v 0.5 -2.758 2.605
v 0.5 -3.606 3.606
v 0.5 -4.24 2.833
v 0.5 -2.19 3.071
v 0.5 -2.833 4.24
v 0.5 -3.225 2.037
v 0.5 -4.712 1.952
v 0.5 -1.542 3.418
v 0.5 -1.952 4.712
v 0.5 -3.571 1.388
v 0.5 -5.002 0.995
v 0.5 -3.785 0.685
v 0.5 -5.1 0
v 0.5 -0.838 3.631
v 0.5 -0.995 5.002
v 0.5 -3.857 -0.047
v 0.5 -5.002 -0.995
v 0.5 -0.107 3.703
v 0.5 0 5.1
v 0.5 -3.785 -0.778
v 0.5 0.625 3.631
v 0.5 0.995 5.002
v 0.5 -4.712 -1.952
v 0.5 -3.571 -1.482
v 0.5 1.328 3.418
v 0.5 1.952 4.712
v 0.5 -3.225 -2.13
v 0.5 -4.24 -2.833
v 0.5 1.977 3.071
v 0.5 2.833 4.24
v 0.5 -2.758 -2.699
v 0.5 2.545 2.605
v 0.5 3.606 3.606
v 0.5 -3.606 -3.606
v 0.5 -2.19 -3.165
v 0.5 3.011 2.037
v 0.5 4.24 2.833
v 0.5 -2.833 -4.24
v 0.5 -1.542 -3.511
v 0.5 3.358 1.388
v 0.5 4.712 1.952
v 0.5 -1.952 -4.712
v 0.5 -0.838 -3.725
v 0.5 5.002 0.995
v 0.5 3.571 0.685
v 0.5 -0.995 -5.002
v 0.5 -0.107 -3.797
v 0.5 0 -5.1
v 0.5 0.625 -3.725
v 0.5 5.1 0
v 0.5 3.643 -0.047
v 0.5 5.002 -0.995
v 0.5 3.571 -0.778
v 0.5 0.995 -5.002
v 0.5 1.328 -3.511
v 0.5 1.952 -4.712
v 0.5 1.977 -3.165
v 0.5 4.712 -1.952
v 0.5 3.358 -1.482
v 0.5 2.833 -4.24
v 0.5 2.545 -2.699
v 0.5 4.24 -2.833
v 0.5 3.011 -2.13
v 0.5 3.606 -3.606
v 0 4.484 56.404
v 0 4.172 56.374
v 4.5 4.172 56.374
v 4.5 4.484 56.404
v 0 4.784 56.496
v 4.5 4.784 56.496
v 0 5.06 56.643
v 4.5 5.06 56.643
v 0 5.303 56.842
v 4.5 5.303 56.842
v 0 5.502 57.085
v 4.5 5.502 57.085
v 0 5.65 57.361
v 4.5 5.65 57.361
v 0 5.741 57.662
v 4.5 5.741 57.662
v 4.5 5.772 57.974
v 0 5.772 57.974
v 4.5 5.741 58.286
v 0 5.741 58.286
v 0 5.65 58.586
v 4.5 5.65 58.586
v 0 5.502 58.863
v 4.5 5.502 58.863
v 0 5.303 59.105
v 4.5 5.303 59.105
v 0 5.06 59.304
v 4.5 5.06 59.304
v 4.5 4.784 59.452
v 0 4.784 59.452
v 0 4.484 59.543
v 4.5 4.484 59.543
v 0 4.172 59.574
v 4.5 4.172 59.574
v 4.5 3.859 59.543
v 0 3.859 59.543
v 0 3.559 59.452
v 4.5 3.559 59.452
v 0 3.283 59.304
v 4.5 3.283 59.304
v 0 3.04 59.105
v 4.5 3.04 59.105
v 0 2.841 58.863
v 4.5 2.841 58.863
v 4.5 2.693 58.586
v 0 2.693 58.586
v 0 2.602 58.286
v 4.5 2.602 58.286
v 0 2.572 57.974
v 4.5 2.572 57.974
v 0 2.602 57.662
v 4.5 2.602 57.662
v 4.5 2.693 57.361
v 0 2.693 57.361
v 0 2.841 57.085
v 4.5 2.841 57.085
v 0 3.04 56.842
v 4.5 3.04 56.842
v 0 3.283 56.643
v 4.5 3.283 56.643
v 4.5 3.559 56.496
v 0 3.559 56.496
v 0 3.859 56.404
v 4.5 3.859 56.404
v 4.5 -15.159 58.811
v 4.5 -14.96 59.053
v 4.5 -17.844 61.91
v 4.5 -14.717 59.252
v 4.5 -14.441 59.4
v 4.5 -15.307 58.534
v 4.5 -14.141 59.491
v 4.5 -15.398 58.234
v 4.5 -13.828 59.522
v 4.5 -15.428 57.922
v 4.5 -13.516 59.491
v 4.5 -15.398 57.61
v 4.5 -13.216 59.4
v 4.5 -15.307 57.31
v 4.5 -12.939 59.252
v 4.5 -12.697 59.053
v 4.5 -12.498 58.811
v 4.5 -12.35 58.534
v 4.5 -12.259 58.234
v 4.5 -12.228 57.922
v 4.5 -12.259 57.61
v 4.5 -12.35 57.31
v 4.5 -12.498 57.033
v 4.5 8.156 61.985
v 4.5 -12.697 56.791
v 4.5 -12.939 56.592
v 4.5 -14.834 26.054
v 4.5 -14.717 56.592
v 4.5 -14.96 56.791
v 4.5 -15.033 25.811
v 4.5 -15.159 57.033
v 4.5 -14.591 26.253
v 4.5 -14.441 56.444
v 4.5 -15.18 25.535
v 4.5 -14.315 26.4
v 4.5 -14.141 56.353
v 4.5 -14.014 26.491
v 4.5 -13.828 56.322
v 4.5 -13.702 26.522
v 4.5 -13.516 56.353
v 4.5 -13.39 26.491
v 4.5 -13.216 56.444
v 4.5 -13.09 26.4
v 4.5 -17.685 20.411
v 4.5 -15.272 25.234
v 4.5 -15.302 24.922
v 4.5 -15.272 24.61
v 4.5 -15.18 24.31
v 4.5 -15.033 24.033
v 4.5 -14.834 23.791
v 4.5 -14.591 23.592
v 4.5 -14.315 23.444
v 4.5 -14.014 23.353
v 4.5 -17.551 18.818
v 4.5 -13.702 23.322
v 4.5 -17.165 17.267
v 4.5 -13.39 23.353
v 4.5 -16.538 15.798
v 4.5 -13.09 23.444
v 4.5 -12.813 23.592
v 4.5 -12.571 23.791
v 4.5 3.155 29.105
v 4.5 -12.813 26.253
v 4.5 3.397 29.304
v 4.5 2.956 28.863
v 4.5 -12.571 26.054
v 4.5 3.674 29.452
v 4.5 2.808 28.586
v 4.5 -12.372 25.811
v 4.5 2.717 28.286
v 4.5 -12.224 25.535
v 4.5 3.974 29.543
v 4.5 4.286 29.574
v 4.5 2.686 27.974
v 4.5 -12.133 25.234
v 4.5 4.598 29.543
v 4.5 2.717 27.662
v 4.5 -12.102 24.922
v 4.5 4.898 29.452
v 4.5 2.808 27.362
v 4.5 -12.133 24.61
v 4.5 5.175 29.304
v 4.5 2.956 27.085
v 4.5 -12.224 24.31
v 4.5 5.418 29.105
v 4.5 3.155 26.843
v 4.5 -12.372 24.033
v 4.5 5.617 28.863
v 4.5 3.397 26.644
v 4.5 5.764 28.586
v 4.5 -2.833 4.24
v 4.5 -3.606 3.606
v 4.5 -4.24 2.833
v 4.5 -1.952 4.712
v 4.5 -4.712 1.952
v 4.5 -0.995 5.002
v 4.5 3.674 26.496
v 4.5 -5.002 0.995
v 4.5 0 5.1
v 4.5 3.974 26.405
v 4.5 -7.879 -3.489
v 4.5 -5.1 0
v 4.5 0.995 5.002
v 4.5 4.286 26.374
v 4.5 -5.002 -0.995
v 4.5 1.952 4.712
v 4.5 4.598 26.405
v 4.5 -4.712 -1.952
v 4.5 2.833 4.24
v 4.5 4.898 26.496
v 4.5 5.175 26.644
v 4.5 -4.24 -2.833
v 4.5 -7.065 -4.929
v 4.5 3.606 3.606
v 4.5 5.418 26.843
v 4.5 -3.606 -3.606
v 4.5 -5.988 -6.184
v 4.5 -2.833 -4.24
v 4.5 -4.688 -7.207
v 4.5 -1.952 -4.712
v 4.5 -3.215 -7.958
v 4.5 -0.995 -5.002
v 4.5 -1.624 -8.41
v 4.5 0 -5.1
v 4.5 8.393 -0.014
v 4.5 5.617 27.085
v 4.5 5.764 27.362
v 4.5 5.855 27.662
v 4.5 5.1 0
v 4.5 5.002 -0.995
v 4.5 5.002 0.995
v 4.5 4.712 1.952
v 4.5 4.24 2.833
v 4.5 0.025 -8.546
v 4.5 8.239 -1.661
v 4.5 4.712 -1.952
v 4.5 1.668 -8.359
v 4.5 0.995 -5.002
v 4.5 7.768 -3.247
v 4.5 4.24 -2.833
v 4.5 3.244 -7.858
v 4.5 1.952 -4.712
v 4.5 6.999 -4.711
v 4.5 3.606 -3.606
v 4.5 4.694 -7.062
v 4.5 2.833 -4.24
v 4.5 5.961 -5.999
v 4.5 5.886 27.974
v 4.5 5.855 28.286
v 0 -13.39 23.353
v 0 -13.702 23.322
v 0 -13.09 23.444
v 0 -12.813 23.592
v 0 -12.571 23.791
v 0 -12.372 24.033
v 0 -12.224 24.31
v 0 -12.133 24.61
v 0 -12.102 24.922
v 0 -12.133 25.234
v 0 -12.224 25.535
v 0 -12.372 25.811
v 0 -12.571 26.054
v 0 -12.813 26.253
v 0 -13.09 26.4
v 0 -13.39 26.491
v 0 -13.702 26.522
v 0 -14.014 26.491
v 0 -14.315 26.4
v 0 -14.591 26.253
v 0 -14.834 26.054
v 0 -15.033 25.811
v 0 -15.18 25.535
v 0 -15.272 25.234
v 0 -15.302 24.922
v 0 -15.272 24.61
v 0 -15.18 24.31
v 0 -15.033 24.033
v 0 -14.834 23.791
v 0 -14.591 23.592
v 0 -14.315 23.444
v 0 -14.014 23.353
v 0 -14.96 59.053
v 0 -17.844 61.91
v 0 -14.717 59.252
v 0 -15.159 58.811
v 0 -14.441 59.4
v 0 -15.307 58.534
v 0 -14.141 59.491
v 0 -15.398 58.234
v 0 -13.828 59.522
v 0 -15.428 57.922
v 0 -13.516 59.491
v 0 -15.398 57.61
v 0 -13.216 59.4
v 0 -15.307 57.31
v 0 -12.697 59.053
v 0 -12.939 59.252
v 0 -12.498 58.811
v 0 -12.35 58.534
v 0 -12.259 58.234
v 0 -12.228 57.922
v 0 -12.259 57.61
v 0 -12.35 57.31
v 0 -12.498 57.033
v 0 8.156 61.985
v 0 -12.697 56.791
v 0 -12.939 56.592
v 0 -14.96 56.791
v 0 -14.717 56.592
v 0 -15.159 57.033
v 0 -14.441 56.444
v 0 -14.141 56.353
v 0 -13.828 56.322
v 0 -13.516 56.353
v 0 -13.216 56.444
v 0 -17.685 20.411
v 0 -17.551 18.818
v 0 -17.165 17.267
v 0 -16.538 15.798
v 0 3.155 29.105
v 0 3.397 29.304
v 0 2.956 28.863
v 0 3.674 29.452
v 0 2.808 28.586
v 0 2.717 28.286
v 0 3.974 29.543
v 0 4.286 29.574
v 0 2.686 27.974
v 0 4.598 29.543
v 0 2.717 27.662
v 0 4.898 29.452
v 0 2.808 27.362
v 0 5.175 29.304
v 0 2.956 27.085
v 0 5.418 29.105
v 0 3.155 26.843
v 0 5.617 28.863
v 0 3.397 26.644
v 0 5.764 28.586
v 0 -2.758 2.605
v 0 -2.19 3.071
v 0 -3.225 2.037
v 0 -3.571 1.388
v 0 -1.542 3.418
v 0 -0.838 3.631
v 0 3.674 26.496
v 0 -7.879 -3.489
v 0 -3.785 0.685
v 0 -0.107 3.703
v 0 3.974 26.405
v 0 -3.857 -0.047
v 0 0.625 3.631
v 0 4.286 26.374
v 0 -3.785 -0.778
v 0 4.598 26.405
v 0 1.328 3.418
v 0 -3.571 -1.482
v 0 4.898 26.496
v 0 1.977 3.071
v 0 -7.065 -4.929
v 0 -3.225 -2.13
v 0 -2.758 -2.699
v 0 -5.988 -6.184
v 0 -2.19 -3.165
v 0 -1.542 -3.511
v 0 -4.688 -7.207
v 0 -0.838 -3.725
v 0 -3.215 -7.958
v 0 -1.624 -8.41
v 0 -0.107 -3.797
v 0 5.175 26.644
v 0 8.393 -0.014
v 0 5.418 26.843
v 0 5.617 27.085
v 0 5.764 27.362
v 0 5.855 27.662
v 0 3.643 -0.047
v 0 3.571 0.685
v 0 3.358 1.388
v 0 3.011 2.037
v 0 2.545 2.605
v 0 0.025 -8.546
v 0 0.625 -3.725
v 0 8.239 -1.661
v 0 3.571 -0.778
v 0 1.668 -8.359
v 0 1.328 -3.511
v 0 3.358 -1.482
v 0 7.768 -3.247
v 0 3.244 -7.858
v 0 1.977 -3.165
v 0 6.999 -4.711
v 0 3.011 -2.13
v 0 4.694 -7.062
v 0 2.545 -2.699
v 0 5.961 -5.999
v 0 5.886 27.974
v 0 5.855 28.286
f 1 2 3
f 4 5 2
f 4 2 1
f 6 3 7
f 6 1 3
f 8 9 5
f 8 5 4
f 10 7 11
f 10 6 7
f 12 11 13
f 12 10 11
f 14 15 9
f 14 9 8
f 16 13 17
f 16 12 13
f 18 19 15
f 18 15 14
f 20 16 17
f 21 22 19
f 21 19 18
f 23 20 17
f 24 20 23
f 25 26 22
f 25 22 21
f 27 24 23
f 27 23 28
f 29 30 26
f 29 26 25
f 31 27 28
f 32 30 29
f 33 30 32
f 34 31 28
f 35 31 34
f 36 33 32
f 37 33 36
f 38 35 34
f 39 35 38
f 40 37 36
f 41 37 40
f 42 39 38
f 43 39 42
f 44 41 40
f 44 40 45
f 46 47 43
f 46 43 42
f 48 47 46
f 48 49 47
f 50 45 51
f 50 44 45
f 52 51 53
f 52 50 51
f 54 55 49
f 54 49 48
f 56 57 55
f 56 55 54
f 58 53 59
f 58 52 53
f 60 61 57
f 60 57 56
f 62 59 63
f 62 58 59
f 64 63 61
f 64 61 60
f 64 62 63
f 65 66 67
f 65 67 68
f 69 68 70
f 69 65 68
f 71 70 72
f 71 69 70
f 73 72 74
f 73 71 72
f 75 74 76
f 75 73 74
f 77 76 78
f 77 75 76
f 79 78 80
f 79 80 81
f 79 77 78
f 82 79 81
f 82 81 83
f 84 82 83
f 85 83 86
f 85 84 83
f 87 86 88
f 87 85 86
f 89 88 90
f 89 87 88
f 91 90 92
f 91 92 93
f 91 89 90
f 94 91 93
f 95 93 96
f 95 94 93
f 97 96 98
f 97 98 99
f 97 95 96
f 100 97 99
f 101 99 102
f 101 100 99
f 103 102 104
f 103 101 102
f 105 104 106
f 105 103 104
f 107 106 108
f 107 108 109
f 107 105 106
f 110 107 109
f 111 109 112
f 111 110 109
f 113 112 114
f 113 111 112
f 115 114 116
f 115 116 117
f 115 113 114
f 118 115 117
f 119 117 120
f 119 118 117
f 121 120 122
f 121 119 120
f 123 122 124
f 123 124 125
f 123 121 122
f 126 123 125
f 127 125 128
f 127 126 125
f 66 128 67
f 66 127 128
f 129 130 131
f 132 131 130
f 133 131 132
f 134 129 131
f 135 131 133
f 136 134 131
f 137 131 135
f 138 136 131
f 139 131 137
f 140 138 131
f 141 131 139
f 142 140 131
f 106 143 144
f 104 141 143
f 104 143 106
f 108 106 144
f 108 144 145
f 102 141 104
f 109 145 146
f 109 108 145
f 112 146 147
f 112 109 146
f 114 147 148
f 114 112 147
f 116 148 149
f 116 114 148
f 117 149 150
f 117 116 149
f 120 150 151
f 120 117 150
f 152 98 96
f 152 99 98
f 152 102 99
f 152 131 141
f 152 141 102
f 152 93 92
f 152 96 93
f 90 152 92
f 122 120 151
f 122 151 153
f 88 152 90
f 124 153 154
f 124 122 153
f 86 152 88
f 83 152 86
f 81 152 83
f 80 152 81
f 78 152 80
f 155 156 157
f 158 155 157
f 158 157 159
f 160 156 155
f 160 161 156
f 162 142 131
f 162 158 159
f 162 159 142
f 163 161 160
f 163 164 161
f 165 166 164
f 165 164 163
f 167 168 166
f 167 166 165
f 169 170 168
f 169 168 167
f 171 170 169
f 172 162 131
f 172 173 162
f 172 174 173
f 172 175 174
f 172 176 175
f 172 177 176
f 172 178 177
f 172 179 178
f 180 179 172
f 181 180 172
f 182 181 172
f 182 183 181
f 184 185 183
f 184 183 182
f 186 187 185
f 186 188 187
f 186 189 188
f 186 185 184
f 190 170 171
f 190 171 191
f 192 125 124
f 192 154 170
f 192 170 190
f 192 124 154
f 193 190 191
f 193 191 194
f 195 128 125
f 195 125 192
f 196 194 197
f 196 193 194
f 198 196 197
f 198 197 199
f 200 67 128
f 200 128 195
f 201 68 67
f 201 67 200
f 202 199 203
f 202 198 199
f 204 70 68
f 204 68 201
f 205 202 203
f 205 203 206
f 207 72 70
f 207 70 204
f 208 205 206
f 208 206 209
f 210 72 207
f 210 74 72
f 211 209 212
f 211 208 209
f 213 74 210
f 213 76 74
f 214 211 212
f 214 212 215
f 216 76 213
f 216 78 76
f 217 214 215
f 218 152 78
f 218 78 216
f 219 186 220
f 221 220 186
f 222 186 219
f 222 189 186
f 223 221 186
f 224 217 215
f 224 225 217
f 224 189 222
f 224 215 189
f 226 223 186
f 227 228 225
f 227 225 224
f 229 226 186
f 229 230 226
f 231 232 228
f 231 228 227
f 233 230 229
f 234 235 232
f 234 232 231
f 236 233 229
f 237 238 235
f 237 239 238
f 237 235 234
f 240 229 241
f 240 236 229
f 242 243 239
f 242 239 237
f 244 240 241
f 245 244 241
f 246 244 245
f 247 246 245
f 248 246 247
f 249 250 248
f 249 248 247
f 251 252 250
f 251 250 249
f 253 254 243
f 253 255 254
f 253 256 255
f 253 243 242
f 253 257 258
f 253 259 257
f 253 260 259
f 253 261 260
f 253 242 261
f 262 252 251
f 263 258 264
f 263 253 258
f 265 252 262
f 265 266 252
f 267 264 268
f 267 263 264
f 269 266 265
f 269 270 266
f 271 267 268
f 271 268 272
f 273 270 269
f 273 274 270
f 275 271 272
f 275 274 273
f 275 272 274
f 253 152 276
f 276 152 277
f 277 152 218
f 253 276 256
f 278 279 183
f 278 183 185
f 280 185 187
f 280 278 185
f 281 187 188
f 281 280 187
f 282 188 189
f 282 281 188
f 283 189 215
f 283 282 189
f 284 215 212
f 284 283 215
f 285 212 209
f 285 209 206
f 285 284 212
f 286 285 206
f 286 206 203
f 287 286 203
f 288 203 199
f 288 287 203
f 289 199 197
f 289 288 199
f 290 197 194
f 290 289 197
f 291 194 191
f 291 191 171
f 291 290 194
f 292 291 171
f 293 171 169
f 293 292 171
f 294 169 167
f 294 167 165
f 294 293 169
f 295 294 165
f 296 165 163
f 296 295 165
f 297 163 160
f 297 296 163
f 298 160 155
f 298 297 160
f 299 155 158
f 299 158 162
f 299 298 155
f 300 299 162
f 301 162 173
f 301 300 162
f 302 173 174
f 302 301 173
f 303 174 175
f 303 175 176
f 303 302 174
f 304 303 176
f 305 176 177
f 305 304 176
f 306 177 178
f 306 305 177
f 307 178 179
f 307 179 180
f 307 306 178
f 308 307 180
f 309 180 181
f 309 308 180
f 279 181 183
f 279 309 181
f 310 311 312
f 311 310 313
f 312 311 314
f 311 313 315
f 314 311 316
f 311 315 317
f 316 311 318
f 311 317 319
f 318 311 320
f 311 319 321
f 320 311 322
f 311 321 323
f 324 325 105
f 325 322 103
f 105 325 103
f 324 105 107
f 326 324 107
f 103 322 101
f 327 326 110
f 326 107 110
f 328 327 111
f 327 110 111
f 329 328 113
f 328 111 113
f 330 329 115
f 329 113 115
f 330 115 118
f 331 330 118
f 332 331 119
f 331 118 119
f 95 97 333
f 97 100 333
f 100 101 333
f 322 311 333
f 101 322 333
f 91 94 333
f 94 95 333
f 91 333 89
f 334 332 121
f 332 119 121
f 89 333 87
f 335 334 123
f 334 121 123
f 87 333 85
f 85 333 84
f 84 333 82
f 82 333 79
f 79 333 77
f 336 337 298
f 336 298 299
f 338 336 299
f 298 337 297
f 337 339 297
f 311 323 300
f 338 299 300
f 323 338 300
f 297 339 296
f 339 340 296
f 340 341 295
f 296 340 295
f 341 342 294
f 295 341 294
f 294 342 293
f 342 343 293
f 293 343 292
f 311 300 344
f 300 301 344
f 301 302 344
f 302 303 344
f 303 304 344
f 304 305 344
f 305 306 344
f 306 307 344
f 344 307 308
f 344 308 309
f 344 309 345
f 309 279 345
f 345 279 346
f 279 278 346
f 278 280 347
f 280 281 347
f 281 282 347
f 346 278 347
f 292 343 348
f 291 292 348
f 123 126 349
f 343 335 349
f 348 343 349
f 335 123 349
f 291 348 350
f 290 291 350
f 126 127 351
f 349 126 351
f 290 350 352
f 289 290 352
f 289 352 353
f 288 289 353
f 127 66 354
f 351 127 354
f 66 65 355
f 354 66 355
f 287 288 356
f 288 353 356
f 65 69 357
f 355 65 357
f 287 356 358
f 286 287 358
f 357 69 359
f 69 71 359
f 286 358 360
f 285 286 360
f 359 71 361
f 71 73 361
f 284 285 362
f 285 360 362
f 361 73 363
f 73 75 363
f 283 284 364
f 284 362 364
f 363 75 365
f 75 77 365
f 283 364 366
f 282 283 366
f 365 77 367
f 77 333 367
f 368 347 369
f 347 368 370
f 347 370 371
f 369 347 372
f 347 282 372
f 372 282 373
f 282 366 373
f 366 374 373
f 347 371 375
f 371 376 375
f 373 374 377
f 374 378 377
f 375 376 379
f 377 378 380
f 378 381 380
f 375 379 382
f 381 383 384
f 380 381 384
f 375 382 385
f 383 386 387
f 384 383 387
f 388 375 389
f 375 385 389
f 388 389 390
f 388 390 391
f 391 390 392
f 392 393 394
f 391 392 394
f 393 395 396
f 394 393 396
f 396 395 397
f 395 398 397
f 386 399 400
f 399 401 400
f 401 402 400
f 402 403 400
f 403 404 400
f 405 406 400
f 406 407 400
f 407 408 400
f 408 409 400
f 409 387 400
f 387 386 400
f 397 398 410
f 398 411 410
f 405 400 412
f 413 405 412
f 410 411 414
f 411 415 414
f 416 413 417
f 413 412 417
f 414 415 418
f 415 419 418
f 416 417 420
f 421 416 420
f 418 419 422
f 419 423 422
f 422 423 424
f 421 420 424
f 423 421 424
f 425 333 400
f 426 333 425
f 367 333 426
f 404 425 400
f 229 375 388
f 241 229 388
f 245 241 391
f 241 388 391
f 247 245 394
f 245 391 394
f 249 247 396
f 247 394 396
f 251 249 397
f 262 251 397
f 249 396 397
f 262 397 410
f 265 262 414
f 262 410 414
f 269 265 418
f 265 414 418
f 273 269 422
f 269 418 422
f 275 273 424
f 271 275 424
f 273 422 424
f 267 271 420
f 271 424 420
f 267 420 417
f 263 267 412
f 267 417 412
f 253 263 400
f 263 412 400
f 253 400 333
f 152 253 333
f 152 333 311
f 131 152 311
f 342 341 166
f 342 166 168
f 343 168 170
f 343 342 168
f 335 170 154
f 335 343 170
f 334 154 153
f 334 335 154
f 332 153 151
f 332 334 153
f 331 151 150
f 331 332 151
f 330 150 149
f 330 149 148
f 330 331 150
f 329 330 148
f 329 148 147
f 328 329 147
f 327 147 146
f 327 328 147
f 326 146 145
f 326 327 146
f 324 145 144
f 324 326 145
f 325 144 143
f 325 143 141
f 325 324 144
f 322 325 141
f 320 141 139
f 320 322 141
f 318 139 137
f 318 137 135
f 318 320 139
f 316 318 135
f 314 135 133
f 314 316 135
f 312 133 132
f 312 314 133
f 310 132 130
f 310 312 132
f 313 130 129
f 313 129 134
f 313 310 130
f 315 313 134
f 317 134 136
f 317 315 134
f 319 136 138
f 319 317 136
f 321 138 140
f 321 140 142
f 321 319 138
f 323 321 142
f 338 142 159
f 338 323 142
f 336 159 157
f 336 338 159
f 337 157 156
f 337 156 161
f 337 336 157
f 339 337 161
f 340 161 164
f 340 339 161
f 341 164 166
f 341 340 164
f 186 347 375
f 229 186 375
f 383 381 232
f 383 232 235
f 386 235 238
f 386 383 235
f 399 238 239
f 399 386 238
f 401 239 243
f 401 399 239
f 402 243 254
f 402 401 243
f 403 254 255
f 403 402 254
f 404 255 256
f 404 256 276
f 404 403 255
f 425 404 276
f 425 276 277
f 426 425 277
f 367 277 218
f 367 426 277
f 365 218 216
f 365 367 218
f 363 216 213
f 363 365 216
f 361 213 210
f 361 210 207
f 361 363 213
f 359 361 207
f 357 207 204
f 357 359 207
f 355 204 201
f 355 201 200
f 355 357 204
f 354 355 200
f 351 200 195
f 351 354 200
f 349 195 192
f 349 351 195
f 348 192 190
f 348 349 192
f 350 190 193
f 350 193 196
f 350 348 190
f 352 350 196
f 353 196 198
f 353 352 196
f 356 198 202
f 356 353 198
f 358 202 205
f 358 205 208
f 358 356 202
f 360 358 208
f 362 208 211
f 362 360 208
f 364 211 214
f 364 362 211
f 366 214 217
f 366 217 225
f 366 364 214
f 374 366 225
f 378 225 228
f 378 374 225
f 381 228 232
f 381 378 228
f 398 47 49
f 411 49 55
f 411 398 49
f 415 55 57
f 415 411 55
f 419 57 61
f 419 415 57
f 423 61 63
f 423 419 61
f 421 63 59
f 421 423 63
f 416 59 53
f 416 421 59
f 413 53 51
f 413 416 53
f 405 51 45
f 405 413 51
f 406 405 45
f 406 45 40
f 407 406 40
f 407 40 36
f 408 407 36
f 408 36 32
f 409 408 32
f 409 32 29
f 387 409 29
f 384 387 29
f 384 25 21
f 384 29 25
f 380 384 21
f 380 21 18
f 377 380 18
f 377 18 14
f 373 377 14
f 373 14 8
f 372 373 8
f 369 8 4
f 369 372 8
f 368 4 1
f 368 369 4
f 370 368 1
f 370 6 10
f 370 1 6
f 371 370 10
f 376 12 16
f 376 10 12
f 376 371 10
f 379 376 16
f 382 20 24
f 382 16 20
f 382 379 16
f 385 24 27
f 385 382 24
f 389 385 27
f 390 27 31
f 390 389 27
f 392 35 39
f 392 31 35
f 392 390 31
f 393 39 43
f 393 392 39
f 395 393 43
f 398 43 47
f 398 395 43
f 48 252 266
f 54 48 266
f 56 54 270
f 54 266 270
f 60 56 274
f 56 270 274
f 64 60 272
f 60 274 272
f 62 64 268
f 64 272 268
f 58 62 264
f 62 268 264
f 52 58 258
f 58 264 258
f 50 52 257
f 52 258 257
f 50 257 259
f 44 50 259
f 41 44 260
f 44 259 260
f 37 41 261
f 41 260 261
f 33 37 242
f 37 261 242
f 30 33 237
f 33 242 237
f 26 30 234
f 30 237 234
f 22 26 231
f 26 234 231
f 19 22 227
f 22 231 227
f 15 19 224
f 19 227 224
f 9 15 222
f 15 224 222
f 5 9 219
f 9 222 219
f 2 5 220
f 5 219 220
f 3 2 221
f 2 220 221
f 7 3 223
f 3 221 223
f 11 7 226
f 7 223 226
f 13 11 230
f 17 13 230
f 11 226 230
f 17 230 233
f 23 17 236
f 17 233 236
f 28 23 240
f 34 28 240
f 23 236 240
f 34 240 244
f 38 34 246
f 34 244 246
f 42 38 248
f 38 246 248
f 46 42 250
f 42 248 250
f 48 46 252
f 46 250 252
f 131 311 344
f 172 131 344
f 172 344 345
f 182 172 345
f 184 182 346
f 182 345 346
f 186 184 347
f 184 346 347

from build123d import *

# Parameters (mm, degrees)
SKETCH_1_R          = 3.75
SKETCH_1_R_2        = 1.6
EXTRUDE_1_DEPTH     = 4.5
SKETCH_2_R          = 5.1
CUT_EXTRUDE_1_DEPTH = 4


with BuildPart() as part:
    # 草图1 → 凸台-拉伸1 (new body)
    with BuildSketch(Plane(origin=(0, 0, 0), x_dir=(0, 0, -1), z_dir=(1, 0, 0))):
        with BuildLine():
            Line((-15.79768273, -16.537533957), (3.488631385, -7.878744113))
            ThreePointArc((3.488631385, -7.878744113), (8.359485225, 1.66812029), (0.014361881, 8.393204188))
            Line((0.014361881, 8.393204188), (-61.98518523, 8.15622713))
            Line((-61.98518523, 8.15622713), (-61.910470293, -17.843665517))
            Line((-61.910470293, -17.843665517), (-20.410773437, -17.685043777))
            ThreePointArc((-20.410773437, -17.685043777), (-18.035050818, -17.389387577), (-15.79768273, -16.537533957))
        make_face()
        with Locations((0.046850671, -0.106733722)):
            Circle(SKETCH_1_R, mode=Mode.SUBTRACT)
        with Locations((-57.973718038, 4.171530696)):
            Circle(SKETCH_1_R_2, mode=Mode.SUBTRACT)
        with Locations((-24.922233336, -13.702270131)):
            Circle(SKETCH_1_R_2, mode=Mode.SUBTRACT)
        with Locations((-27.973937178, 4.286197014)):
            Circle(SKETCH_1_R_2, mode=Mode.SUBTRACT)
        with Locations((-57.921992313, -13.828394983)):
            Circle(SKETCH_1_R_2, mode=Mode.SUBTRACT)
    extrude(amount=EXTRUDE_1_DEPTH)

    # 草图2 → 切除-拉伸1 (cut)
    with BuildSketch(Plane(origin=(4.5, 0, 0), x_dir=(0, 0, -1), z_dir=(1, 0, 0))):
        Circle(SKETCH_2_R)
    extrude(amount=-CUT_EXTRUDE_1_DEPTH, mode=Mode.SUBTRACT)


solid = part.part
